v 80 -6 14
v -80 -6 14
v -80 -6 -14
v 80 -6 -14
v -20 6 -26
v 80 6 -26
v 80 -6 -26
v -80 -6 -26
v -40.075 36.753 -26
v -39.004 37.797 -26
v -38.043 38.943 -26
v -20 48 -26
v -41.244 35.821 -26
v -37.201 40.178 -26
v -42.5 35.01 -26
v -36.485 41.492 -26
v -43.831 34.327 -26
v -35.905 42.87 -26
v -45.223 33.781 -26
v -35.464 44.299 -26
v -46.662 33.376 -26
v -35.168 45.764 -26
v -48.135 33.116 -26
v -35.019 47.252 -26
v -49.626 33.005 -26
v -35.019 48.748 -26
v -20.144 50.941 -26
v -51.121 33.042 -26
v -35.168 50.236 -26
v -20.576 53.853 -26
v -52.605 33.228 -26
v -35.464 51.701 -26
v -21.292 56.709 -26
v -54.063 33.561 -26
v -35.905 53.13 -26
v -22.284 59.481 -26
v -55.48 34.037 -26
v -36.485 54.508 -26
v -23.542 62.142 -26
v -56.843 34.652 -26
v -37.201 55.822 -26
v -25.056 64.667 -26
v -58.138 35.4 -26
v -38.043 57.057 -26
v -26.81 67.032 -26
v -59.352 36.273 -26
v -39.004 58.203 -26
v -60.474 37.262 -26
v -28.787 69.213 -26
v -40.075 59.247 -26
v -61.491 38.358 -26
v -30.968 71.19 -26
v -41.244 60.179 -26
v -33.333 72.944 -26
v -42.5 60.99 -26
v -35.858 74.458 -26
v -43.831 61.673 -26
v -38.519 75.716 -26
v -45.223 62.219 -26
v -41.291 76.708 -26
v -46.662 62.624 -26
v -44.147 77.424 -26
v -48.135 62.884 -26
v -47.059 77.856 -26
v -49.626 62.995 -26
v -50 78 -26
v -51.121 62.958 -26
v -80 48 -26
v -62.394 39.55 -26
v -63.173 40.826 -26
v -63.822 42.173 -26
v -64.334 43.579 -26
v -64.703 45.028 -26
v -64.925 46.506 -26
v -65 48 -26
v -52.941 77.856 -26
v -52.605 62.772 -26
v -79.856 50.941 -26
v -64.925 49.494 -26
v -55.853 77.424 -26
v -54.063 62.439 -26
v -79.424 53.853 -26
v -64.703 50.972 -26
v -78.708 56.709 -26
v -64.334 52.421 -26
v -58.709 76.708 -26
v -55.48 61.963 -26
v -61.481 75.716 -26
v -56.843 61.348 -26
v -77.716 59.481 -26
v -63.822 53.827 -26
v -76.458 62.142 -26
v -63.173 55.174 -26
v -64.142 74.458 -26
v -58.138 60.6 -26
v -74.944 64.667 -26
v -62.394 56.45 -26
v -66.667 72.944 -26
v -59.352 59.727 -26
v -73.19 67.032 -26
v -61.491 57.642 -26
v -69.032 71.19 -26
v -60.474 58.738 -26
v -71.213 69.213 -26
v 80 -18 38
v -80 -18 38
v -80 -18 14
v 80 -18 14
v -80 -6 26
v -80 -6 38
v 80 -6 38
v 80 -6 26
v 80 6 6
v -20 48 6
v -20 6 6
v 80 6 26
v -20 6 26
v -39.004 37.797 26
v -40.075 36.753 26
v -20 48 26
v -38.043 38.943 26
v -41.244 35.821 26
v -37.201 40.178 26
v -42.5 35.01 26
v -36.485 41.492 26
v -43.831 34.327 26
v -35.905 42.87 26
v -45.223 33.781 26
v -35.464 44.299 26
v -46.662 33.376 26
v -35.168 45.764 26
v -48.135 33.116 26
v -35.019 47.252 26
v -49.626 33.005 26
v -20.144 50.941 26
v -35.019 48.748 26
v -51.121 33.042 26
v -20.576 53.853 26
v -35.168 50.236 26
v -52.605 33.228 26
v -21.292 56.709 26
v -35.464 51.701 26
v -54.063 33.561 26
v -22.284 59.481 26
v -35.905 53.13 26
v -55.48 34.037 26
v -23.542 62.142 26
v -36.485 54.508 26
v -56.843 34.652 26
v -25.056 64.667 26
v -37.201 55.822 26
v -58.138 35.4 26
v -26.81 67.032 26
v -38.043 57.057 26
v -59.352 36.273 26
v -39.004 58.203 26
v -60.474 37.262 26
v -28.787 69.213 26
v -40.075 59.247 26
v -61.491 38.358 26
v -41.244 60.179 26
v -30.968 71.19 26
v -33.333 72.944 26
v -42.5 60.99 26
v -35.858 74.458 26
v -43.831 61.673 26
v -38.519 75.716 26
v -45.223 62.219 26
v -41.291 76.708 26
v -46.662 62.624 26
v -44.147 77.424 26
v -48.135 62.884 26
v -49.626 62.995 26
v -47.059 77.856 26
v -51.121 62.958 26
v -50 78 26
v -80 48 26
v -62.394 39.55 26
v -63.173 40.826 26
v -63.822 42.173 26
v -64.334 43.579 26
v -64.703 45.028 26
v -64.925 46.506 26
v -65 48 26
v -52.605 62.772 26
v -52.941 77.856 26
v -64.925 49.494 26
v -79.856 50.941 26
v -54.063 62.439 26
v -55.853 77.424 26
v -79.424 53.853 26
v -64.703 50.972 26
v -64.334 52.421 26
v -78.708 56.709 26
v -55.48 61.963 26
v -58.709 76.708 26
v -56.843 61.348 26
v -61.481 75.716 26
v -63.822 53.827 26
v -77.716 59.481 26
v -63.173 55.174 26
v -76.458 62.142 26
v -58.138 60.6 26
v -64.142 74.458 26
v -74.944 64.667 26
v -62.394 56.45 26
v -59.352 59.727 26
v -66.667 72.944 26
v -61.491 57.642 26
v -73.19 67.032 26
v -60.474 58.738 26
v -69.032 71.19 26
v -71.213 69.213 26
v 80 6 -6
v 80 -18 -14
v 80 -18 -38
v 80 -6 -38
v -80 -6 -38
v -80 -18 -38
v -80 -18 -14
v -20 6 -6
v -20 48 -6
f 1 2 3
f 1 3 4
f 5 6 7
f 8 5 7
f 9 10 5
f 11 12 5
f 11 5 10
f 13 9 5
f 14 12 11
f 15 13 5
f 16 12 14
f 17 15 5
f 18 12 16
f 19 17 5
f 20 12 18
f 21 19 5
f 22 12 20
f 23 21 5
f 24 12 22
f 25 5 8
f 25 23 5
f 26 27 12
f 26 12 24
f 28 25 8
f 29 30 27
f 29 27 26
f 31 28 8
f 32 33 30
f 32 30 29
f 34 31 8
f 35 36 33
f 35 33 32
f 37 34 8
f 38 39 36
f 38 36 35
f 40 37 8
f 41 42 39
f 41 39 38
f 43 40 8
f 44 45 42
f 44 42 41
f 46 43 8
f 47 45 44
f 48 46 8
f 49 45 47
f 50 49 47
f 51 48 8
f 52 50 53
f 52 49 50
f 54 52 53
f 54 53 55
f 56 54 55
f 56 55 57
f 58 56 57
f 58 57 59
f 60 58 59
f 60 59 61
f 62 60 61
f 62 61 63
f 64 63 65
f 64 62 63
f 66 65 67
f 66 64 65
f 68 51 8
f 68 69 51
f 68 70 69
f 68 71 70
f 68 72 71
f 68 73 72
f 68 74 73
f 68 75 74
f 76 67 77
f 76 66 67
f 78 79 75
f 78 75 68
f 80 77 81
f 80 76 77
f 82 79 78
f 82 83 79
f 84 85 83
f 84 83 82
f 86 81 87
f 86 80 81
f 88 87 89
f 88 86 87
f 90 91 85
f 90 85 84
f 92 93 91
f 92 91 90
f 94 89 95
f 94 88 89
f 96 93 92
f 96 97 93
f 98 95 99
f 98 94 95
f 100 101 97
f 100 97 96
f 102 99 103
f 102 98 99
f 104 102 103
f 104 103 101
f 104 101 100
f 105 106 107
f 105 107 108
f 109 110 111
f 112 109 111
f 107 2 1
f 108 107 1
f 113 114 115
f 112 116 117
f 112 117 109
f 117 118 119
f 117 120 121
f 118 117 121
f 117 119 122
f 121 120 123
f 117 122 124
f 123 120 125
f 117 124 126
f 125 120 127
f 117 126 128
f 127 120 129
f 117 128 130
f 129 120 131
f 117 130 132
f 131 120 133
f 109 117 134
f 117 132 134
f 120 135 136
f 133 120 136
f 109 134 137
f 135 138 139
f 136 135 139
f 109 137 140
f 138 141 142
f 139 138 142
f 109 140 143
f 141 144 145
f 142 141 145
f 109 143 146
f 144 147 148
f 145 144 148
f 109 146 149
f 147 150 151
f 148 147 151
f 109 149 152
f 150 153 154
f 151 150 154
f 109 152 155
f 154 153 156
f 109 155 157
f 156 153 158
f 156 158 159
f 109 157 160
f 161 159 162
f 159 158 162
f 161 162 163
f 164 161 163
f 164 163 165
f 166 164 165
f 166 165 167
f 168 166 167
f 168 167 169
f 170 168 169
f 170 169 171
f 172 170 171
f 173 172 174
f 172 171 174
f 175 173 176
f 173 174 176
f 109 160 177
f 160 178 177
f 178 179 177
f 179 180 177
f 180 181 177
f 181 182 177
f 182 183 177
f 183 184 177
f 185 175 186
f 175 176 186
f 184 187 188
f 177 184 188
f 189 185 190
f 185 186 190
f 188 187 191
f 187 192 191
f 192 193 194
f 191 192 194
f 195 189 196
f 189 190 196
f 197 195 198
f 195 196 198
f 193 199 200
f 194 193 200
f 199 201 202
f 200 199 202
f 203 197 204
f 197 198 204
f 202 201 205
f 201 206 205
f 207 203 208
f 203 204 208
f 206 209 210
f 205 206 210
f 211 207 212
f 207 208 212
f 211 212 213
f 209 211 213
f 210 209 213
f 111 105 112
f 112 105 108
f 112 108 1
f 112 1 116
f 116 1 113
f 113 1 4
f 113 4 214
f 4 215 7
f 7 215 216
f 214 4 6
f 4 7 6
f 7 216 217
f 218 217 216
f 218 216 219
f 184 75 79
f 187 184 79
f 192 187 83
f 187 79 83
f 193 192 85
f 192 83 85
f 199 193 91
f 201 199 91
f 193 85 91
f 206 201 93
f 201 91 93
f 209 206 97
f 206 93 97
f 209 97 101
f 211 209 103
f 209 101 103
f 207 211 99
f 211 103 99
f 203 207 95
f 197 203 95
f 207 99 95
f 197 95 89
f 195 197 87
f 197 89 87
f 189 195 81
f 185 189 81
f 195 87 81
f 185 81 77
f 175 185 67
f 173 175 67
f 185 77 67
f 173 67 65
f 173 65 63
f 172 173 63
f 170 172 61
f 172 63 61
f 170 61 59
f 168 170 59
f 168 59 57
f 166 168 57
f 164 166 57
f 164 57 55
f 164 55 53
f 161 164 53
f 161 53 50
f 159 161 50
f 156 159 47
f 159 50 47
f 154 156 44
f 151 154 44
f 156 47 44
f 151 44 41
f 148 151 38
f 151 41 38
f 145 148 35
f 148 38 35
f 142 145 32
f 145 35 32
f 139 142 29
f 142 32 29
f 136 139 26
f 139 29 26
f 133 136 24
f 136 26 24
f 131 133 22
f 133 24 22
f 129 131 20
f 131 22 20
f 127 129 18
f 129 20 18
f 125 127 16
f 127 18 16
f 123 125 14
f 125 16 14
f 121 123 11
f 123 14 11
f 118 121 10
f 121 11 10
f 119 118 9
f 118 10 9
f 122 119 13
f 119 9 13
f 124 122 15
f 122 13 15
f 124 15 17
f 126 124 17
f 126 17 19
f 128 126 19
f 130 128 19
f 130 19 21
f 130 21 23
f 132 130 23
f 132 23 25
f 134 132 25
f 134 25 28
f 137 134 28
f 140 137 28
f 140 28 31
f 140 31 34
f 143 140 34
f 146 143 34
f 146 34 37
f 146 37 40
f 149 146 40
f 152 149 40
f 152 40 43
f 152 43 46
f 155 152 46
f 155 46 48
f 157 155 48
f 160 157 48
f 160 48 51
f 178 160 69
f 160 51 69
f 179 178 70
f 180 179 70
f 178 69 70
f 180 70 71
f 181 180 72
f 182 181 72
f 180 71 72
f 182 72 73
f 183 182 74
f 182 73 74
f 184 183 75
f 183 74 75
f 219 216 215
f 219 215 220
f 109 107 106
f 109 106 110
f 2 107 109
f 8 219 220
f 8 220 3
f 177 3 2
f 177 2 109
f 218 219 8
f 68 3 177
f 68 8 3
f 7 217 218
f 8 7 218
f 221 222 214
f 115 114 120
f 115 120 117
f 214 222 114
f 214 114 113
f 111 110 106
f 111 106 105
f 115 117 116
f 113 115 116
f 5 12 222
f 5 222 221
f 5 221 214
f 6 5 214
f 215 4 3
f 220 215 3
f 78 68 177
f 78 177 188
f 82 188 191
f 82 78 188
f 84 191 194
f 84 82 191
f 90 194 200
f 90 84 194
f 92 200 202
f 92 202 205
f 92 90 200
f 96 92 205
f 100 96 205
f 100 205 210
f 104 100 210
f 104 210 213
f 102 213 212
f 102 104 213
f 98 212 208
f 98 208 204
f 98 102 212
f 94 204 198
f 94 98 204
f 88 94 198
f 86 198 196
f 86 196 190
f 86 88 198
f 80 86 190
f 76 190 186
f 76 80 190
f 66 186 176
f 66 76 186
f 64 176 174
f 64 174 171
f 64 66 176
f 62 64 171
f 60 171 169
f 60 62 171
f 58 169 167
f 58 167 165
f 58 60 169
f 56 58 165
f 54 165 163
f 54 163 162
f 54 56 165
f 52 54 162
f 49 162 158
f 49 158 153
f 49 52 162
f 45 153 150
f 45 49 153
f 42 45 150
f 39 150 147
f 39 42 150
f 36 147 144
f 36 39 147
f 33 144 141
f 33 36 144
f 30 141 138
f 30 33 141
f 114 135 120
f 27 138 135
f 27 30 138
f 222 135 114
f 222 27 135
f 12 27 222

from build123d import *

# Parameters (mm, degrees)
SKETCH3_W           = 160
SKETCH3_H           = 12
BOSS_EXTRUDE2_DEPTH = 26
SKETCH4_W           = 160
SKETCH4_H           = 12
BOSS_EXTRUDE3_DEPTH = 12
SKETCH5_W           = 160
SKETCH5_H           = 12
BOSS_EXTRUDE4_DEPTH = 12
SKETCH8_R           = 15
BOSS_EXTRUDE5_DEPTH = 52
RIB1_REACH          = 120.017
SKETCH14_WALL_W     = 346.495870774
SKETCH14_WALL_H     = 12


with BuildPart() as part:
    # Sketch3 → Boss-Extrude2 (new, symmetric)
    with BuildSketch(Plane.XY):
        Rectangle(SKETCH3_W, SKETCH3_H)
    extrude(amount=BOSS_EXTRUDE2_DEPTH, both=True)

    # Sketch4 → Boss-Extrude3 (add, symmetric)
    with BuildSketch(Plane.XY.offset(26)):
        with Locations((0, -12)):
            Rectangle(SKETCH4_W, SKETCH4_H)
    extrude(amount=BOSS_EXTRUDE3_DEPTH, both=True)

    # Sketch5 → Boss-Extrude4 (add, symmetric)
    with BuildSketch(Plane(origin=(0, 0, -26), x_dir=(-1, 0, 0), z_dir=(0, 0, -1))):
        with Locations((0, -12)):
            Rectangle(SKETCH5_W, SKETCH5_H)
    extrude(amount=BOSS_EXTRUDE4_DEPTH, both=True)

    # Sketch8 → Boss-Extrude5 (add)
    with BuildSketch(Plane(origin=(0, 0, -26), x_dir=(-1, 0, 0), z_dir=(0, 0, -1))):
        with BuildLine():
            Line((20, 6), (80, 6))
            Line((80, 6), (80, 48))
            ThreePointArc((80, 48), (50, 78), (20, 48))
            Line((20, 48), (20, 6))
        make_face()
        with Locations((50, 48)):
            Circle(SKETCH8_R, mode=Mode.SUBTRACT)
    extrude(amount=-BOSS_EXTRUDE5_DEPTH)

    # Sketch14 wall → Rib1 (add, up to next)
    with BuildSketch(Plane(origin=(30, 27, 0), x_dir=(0.921982105607, -0.387232484355, 0), z_dir=(0.387232484355, 0.921982105607, 0)), mode=Mode.PRIVATE) as rib1_sk1:
        Rectangle(SKETCH14_WALL_W, SKETCH14_WALL_H)
    rib1_tool1 = extrude(rib1_sk1.sketch, amount=-RIB1_REACH, mode=Mode.PRIVATE) - part.part
    add(rib1_tool1.solids().sort_by_distance((30, 27, 0))[0])


solid = part.part
